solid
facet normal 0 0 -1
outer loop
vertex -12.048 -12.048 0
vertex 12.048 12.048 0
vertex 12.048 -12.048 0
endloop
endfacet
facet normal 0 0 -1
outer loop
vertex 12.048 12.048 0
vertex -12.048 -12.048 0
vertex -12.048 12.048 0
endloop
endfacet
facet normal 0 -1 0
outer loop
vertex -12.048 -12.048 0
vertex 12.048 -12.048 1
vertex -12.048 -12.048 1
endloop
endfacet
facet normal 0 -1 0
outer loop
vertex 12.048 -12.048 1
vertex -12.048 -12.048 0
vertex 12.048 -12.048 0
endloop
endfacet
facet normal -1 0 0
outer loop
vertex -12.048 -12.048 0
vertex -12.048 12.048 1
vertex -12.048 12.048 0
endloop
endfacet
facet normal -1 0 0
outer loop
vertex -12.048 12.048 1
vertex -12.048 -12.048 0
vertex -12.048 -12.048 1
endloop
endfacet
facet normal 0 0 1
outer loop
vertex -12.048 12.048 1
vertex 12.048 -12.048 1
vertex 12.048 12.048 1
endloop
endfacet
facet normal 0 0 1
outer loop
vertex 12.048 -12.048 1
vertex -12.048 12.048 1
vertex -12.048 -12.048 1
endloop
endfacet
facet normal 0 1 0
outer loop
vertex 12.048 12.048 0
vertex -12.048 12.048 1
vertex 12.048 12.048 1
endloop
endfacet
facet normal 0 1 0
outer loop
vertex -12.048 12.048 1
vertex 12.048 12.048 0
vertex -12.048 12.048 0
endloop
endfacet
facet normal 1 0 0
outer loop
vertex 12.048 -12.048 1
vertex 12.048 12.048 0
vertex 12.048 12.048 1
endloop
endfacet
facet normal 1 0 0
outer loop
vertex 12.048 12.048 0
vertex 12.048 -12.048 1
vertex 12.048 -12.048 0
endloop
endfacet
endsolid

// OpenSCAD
// Module names are of the form poly_<inkscape-path-id>().  As a result,
// you can associate a polygon in this OpenSCAD program with the corresponding
// SVG element in the Inkscape document by looking for the XML element with
// the attribute id="inkscape-path-id".

// fudge value is used to ensure that subtracted solids are a tad taller
// in the z dimension than the polygon being subtracted from.  This helps
// keep the resulting .stl file manifold.
fudge = 0.1;

module poly_path20(h)
{
  scale([25.4/90, -25.4/90, 1]) union()
  {
    linear_extrude(height=h)
      polygon([[-42.690625,-42.690625],[42.690625,-42.690625],[42.690625,42.690625],[-42.690625,42.690625],[-42.690625,-42.690625]]);
  }
}

module poly_path24(h)
{
  scale([25.4/90, -25.4/90, 1]) union()
  {
    linear_extrude(height=h)
      polygon([[-42.690625,-42.690625],[42.690625,-42.690625],[42.690625,42.690625],[-42.690625,42.690625],[-42.690625,-42.690625]]);
  }
}

module poly_path16(h)
{
  scale([25.4/90, -25.4/90, 1]) union()
  {
    linear_extrude(height=h)
      polygon([[-42.690625,-42.690625],[42.690625,-42.690625],[42.690625,42.690625],[-42.690625,42.690625],[-42.690625,-42.690625]]);
  }
}

module pcb_mascara(h)
{

poly_path20(h);
poly_path24(h);
poly_path16(h);
}

pcb_mascara(1);
